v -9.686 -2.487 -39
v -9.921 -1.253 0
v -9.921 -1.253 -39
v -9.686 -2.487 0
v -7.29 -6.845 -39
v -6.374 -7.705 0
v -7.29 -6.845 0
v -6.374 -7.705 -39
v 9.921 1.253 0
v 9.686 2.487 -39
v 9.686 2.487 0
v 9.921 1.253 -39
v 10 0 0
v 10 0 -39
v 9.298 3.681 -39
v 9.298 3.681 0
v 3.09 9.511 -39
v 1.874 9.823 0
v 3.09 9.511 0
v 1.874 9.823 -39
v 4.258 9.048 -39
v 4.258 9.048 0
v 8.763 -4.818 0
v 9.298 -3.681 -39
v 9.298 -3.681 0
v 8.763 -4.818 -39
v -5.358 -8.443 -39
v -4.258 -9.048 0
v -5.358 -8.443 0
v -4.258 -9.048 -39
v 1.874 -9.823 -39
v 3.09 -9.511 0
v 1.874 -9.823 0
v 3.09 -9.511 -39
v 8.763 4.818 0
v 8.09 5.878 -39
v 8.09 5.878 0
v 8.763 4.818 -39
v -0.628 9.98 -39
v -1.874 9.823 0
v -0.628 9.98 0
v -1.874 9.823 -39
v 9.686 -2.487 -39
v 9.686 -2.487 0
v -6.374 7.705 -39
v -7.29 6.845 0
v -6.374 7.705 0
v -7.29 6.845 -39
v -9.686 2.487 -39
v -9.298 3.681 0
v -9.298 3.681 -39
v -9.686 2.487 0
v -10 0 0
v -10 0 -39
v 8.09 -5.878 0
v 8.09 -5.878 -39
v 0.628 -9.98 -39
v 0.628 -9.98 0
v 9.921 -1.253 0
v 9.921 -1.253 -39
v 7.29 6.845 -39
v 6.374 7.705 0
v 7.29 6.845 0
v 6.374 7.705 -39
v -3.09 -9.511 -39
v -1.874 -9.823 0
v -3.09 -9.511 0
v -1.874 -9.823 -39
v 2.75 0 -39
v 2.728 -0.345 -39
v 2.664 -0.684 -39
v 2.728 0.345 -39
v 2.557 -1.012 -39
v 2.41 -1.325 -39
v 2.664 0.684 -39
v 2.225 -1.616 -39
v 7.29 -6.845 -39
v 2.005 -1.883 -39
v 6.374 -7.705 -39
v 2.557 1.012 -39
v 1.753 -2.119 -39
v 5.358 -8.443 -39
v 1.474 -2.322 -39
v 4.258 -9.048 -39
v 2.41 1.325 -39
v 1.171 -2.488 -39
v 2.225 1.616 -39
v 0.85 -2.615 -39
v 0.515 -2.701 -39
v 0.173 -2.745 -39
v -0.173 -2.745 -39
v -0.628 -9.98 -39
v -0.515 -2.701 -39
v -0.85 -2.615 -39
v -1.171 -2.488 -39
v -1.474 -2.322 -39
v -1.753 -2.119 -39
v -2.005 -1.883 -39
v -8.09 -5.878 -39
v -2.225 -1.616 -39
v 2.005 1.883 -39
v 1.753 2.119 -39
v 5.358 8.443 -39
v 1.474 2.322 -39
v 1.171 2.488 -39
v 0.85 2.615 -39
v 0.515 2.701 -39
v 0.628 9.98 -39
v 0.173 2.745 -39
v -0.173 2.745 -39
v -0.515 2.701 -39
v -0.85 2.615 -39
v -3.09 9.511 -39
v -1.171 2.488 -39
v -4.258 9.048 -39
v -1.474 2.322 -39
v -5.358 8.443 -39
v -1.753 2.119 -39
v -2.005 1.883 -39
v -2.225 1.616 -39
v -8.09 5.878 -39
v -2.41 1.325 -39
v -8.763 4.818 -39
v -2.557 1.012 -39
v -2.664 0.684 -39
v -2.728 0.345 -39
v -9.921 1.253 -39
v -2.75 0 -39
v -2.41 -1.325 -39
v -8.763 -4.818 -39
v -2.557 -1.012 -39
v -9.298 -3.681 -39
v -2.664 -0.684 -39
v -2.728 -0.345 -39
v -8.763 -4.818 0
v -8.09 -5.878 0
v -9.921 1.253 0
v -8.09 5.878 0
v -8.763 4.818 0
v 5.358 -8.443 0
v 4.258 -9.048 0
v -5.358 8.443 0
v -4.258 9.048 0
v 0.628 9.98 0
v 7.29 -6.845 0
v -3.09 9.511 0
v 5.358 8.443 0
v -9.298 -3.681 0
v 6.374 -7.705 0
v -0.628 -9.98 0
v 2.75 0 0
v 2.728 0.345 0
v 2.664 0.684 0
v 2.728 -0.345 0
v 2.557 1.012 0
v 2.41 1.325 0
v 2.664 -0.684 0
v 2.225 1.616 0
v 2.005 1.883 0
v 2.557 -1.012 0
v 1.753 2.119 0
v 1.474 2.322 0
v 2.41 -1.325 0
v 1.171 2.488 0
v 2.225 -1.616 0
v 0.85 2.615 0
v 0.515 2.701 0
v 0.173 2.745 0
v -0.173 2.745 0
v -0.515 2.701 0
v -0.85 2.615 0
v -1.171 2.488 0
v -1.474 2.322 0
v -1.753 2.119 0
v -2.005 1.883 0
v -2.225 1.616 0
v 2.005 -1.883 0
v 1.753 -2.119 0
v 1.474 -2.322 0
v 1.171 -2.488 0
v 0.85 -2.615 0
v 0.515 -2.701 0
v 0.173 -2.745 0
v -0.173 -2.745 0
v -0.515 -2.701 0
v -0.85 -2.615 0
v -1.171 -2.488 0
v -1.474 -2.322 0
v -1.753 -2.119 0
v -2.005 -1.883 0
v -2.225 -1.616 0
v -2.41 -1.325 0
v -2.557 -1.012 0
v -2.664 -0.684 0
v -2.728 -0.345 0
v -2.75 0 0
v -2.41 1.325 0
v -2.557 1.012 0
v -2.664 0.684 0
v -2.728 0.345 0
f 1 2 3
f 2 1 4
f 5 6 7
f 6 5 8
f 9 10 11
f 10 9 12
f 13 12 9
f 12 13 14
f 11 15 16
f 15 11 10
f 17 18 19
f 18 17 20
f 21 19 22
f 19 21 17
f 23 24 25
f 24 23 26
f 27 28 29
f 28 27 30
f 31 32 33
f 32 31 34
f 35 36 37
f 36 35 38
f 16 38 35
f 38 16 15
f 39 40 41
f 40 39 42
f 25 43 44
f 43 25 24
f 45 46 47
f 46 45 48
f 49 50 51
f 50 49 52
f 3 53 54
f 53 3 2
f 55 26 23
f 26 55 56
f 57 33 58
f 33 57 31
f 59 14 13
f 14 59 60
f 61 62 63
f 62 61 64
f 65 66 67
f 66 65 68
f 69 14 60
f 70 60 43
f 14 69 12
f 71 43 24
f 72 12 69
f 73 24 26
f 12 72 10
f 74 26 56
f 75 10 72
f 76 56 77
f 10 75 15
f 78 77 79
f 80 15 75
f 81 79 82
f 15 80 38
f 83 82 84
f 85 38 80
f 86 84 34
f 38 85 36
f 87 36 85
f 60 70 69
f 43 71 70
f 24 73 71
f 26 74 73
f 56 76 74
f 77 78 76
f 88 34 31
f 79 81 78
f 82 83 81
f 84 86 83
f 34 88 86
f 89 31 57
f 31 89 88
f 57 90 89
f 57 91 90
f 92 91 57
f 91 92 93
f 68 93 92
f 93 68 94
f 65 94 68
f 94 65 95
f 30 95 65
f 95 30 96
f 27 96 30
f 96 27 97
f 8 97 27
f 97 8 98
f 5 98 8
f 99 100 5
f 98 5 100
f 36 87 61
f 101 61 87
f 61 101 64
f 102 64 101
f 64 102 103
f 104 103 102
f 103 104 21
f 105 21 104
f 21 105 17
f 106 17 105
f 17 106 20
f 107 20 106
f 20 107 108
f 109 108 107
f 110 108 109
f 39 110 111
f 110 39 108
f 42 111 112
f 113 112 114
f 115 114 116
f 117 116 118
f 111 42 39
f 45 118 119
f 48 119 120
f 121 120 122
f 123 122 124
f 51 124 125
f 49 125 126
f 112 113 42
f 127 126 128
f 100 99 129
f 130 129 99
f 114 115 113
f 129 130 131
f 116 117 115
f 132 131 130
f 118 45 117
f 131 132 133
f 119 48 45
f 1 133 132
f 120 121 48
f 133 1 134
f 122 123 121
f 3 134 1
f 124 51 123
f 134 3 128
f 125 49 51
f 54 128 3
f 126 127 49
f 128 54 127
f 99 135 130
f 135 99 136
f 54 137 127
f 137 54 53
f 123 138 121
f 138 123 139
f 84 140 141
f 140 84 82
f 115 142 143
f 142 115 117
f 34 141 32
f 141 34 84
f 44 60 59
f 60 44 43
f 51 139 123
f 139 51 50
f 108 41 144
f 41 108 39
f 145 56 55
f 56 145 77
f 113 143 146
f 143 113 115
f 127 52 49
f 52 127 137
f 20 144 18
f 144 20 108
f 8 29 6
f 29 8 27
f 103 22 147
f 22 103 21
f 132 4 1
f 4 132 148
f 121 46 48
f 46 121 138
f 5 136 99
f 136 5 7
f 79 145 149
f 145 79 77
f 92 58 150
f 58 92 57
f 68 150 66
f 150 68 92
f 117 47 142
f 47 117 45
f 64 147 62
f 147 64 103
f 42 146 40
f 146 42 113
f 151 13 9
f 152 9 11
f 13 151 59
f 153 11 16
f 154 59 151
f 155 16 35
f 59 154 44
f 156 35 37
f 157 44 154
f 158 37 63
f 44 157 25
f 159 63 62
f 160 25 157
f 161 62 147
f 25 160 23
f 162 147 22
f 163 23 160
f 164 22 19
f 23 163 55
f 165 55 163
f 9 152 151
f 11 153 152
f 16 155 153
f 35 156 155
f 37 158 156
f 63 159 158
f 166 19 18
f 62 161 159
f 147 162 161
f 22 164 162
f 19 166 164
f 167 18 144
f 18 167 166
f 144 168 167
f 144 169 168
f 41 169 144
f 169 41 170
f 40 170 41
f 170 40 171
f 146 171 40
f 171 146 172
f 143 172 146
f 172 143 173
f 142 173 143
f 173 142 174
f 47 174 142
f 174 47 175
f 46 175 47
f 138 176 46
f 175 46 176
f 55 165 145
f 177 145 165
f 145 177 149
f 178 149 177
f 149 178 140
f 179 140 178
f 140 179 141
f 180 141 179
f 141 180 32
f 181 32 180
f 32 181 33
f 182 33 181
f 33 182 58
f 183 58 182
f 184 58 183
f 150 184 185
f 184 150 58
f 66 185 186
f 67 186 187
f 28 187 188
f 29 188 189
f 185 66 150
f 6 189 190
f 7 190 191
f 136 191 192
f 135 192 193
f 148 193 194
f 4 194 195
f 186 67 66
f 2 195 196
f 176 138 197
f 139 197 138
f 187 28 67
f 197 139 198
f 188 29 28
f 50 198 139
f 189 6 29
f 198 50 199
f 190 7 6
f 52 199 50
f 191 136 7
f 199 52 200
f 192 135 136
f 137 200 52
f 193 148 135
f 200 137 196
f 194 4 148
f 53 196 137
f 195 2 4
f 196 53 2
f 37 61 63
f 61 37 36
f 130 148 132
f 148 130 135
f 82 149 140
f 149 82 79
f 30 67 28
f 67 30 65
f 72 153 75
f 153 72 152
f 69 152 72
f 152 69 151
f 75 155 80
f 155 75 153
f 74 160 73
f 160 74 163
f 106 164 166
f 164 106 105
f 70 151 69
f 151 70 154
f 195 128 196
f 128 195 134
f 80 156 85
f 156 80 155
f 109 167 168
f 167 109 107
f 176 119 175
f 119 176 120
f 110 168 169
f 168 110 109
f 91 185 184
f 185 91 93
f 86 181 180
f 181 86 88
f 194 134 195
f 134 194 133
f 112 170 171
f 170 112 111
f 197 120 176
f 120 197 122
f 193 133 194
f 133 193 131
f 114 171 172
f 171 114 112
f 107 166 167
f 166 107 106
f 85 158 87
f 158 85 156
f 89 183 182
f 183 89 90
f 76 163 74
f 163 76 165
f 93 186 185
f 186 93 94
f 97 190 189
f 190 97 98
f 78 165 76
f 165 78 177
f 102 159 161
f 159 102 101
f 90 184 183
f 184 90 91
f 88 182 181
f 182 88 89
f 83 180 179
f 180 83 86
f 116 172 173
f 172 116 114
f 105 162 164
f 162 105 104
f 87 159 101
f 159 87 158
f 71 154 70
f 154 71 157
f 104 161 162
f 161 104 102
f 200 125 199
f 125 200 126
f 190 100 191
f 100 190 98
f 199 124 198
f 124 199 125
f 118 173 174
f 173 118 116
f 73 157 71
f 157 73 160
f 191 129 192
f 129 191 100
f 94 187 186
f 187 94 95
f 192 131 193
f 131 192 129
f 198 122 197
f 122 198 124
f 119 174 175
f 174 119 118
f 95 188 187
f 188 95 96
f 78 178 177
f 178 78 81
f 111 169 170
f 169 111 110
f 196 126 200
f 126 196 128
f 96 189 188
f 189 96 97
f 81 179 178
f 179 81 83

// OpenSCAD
$fn = 50;


difference() {
	union() {
		translate(v = [0, 0, -39.0000000000]) {
			cylinder(h = 39, r = 10.0000000000);
		}
		cylinder(h = 0, r = 20.0000000000);
	}
	union() {
		#translate(v = [0, 0, -39]) {
			cylinder(h = 39, r = 2.7500000000);
		}
	}
}
